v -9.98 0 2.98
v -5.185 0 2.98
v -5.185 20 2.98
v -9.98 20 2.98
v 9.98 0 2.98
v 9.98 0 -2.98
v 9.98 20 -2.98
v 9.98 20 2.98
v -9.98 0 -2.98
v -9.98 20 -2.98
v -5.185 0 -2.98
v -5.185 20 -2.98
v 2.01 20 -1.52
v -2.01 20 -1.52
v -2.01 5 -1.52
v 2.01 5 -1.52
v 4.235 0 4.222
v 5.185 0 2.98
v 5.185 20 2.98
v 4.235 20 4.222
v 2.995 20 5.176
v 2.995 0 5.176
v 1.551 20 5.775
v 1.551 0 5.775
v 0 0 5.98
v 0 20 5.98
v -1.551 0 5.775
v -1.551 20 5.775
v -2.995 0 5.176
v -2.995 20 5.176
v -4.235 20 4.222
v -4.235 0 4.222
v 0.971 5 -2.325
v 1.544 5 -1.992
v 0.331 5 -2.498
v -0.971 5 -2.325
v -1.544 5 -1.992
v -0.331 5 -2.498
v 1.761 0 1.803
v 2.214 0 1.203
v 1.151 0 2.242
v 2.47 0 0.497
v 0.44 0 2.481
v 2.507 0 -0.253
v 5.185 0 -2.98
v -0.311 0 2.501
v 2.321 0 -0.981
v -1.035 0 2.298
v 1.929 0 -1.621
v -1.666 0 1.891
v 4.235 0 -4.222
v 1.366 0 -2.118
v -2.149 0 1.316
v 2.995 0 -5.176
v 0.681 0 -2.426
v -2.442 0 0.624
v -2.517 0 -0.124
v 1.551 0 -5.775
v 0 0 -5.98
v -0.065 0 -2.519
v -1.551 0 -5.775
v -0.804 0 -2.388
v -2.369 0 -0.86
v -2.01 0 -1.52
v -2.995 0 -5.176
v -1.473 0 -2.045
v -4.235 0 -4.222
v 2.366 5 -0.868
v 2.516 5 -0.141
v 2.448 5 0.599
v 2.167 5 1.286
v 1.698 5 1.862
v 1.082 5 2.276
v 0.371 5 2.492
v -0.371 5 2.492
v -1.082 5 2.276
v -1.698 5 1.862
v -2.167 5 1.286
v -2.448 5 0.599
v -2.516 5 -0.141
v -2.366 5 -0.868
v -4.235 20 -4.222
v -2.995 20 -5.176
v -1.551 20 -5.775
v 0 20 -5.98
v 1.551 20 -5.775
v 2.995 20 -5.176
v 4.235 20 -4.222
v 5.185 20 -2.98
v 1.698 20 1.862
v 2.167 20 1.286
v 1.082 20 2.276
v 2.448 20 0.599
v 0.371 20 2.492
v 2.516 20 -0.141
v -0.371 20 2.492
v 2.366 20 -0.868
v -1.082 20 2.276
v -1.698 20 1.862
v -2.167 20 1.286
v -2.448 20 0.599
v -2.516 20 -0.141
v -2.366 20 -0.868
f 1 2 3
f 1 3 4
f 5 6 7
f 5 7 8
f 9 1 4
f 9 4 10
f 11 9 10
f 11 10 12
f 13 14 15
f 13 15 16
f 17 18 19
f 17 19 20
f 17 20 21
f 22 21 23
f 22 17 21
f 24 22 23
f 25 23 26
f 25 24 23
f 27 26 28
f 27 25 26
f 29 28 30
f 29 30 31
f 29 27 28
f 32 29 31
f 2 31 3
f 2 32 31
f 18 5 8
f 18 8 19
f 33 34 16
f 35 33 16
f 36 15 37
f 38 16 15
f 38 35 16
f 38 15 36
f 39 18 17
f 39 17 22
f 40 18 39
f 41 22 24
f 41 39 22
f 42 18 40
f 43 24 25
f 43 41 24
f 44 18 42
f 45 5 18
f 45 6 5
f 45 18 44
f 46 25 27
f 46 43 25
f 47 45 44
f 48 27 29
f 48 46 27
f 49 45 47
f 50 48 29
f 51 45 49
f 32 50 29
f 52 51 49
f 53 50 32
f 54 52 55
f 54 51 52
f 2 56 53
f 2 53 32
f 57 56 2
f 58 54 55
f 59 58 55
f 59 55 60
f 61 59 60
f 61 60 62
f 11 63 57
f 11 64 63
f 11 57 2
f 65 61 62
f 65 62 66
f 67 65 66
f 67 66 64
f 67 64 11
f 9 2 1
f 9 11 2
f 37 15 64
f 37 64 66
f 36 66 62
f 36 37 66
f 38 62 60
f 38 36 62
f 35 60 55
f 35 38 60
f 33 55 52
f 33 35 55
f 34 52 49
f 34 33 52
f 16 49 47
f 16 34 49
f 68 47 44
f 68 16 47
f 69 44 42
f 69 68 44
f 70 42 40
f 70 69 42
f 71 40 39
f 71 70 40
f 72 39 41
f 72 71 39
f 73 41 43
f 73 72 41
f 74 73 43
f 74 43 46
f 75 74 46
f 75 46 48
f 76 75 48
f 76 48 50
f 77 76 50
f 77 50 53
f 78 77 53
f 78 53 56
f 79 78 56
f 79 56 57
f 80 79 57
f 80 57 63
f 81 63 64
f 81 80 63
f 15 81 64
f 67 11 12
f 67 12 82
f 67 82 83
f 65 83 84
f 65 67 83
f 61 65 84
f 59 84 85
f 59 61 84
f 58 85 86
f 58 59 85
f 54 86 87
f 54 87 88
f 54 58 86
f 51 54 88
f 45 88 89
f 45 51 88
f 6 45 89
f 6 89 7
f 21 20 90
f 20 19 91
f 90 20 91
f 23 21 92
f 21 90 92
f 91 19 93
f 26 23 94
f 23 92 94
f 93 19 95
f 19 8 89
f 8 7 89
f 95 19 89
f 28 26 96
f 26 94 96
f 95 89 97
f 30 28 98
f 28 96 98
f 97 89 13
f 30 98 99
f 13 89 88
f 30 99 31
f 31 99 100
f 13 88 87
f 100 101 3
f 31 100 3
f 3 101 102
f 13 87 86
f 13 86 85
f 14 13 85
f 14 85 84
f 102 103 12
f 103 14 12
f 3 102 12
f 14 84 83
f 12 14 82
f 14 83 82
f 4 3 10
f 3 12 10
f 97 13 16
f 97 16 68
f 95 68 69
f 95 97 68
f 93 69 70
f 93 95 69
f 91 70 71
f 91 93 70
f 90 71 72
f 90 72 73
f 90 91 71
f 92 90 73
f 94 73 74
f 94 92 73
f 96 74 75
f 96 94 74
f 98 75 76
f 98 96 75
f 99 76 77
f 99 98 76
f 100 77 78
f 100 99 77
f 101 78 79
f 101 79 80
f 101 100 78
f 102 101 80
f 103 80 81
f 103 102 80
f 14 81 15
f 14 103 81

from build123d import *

# Parameters (mm, degrees)
EXTRUDE_3_DEPTH     = 20
CUT_EXTRUDE_4_DEPTH = 15
CUT_EXTRUDE_START   = -5
SKETCH_6_R          = 2.52
CUT_EXTRUDE_5_DEPTH = 5


with BuildPart() as part:
    # 草图1 → 凸台-拉伸3 (new body)
    with BuildSketch(Plane(origin=(0, 0, 0), x_dir=(1, 0, 0), z_dir=(0, 1, 0))):
        with BuildLine():
            Line((9.98, -2.98), (5.184592559, -2.98))
            ThreePointArc((5.184592559, -2.98), (0, -5.98), (-5.184592559, -2.98))
            Line((-5.184592559, -2.98), (-9.98, -2.98))
            Line((-9.98, -2.98), (-9.98, 2.98))
            Line((-9.98, 2.98), (-5.184592559, 2.98))
            ThreePointArc((-5.184592559, 2.98), (0, 5.98), (5.184592559, 2.98))
            Line((5.184592559, 2.98), (9.98, 2.98))
            Line((9.98, 2.98), (9.98, -2.98))
        make_face()
    extrude(amount=EXTRUDE_3_DEPTH)

    # 草图5 → 切除-拉伸4 (cut)
    with BuildSketch(Plane(origin=(0, 20, 0), x_dir=(1, 0, 0), z_dir=(0, 1, 0))):
        with BuildLine():
            Line((-2.009975124, 1.52), (2.009975124, 1.52))
            ThreePointArc((2.009975124, 1.52), (0, -2.52), (-2.009975124, 1.52))
        make_face()
    extrude(amount=-CUT_EXTRUDE_4_DEPTH, mode=Mode.SUBTRACT)

    # 草图6 → 切除-拉伸5 (cut)
    with BuildSketch(Plane.XZ.offset(CUT_EXTRUDE_START)):
        with Locations(Location((0, 0, 0), (0, 0, 217.097601801))):
            Circle(SKETCH_6_R)
    extrude(amount=CUT_EXTRUDE_5_DEPTH, mode=Mode.SUBTRACT)


solid = part.part
